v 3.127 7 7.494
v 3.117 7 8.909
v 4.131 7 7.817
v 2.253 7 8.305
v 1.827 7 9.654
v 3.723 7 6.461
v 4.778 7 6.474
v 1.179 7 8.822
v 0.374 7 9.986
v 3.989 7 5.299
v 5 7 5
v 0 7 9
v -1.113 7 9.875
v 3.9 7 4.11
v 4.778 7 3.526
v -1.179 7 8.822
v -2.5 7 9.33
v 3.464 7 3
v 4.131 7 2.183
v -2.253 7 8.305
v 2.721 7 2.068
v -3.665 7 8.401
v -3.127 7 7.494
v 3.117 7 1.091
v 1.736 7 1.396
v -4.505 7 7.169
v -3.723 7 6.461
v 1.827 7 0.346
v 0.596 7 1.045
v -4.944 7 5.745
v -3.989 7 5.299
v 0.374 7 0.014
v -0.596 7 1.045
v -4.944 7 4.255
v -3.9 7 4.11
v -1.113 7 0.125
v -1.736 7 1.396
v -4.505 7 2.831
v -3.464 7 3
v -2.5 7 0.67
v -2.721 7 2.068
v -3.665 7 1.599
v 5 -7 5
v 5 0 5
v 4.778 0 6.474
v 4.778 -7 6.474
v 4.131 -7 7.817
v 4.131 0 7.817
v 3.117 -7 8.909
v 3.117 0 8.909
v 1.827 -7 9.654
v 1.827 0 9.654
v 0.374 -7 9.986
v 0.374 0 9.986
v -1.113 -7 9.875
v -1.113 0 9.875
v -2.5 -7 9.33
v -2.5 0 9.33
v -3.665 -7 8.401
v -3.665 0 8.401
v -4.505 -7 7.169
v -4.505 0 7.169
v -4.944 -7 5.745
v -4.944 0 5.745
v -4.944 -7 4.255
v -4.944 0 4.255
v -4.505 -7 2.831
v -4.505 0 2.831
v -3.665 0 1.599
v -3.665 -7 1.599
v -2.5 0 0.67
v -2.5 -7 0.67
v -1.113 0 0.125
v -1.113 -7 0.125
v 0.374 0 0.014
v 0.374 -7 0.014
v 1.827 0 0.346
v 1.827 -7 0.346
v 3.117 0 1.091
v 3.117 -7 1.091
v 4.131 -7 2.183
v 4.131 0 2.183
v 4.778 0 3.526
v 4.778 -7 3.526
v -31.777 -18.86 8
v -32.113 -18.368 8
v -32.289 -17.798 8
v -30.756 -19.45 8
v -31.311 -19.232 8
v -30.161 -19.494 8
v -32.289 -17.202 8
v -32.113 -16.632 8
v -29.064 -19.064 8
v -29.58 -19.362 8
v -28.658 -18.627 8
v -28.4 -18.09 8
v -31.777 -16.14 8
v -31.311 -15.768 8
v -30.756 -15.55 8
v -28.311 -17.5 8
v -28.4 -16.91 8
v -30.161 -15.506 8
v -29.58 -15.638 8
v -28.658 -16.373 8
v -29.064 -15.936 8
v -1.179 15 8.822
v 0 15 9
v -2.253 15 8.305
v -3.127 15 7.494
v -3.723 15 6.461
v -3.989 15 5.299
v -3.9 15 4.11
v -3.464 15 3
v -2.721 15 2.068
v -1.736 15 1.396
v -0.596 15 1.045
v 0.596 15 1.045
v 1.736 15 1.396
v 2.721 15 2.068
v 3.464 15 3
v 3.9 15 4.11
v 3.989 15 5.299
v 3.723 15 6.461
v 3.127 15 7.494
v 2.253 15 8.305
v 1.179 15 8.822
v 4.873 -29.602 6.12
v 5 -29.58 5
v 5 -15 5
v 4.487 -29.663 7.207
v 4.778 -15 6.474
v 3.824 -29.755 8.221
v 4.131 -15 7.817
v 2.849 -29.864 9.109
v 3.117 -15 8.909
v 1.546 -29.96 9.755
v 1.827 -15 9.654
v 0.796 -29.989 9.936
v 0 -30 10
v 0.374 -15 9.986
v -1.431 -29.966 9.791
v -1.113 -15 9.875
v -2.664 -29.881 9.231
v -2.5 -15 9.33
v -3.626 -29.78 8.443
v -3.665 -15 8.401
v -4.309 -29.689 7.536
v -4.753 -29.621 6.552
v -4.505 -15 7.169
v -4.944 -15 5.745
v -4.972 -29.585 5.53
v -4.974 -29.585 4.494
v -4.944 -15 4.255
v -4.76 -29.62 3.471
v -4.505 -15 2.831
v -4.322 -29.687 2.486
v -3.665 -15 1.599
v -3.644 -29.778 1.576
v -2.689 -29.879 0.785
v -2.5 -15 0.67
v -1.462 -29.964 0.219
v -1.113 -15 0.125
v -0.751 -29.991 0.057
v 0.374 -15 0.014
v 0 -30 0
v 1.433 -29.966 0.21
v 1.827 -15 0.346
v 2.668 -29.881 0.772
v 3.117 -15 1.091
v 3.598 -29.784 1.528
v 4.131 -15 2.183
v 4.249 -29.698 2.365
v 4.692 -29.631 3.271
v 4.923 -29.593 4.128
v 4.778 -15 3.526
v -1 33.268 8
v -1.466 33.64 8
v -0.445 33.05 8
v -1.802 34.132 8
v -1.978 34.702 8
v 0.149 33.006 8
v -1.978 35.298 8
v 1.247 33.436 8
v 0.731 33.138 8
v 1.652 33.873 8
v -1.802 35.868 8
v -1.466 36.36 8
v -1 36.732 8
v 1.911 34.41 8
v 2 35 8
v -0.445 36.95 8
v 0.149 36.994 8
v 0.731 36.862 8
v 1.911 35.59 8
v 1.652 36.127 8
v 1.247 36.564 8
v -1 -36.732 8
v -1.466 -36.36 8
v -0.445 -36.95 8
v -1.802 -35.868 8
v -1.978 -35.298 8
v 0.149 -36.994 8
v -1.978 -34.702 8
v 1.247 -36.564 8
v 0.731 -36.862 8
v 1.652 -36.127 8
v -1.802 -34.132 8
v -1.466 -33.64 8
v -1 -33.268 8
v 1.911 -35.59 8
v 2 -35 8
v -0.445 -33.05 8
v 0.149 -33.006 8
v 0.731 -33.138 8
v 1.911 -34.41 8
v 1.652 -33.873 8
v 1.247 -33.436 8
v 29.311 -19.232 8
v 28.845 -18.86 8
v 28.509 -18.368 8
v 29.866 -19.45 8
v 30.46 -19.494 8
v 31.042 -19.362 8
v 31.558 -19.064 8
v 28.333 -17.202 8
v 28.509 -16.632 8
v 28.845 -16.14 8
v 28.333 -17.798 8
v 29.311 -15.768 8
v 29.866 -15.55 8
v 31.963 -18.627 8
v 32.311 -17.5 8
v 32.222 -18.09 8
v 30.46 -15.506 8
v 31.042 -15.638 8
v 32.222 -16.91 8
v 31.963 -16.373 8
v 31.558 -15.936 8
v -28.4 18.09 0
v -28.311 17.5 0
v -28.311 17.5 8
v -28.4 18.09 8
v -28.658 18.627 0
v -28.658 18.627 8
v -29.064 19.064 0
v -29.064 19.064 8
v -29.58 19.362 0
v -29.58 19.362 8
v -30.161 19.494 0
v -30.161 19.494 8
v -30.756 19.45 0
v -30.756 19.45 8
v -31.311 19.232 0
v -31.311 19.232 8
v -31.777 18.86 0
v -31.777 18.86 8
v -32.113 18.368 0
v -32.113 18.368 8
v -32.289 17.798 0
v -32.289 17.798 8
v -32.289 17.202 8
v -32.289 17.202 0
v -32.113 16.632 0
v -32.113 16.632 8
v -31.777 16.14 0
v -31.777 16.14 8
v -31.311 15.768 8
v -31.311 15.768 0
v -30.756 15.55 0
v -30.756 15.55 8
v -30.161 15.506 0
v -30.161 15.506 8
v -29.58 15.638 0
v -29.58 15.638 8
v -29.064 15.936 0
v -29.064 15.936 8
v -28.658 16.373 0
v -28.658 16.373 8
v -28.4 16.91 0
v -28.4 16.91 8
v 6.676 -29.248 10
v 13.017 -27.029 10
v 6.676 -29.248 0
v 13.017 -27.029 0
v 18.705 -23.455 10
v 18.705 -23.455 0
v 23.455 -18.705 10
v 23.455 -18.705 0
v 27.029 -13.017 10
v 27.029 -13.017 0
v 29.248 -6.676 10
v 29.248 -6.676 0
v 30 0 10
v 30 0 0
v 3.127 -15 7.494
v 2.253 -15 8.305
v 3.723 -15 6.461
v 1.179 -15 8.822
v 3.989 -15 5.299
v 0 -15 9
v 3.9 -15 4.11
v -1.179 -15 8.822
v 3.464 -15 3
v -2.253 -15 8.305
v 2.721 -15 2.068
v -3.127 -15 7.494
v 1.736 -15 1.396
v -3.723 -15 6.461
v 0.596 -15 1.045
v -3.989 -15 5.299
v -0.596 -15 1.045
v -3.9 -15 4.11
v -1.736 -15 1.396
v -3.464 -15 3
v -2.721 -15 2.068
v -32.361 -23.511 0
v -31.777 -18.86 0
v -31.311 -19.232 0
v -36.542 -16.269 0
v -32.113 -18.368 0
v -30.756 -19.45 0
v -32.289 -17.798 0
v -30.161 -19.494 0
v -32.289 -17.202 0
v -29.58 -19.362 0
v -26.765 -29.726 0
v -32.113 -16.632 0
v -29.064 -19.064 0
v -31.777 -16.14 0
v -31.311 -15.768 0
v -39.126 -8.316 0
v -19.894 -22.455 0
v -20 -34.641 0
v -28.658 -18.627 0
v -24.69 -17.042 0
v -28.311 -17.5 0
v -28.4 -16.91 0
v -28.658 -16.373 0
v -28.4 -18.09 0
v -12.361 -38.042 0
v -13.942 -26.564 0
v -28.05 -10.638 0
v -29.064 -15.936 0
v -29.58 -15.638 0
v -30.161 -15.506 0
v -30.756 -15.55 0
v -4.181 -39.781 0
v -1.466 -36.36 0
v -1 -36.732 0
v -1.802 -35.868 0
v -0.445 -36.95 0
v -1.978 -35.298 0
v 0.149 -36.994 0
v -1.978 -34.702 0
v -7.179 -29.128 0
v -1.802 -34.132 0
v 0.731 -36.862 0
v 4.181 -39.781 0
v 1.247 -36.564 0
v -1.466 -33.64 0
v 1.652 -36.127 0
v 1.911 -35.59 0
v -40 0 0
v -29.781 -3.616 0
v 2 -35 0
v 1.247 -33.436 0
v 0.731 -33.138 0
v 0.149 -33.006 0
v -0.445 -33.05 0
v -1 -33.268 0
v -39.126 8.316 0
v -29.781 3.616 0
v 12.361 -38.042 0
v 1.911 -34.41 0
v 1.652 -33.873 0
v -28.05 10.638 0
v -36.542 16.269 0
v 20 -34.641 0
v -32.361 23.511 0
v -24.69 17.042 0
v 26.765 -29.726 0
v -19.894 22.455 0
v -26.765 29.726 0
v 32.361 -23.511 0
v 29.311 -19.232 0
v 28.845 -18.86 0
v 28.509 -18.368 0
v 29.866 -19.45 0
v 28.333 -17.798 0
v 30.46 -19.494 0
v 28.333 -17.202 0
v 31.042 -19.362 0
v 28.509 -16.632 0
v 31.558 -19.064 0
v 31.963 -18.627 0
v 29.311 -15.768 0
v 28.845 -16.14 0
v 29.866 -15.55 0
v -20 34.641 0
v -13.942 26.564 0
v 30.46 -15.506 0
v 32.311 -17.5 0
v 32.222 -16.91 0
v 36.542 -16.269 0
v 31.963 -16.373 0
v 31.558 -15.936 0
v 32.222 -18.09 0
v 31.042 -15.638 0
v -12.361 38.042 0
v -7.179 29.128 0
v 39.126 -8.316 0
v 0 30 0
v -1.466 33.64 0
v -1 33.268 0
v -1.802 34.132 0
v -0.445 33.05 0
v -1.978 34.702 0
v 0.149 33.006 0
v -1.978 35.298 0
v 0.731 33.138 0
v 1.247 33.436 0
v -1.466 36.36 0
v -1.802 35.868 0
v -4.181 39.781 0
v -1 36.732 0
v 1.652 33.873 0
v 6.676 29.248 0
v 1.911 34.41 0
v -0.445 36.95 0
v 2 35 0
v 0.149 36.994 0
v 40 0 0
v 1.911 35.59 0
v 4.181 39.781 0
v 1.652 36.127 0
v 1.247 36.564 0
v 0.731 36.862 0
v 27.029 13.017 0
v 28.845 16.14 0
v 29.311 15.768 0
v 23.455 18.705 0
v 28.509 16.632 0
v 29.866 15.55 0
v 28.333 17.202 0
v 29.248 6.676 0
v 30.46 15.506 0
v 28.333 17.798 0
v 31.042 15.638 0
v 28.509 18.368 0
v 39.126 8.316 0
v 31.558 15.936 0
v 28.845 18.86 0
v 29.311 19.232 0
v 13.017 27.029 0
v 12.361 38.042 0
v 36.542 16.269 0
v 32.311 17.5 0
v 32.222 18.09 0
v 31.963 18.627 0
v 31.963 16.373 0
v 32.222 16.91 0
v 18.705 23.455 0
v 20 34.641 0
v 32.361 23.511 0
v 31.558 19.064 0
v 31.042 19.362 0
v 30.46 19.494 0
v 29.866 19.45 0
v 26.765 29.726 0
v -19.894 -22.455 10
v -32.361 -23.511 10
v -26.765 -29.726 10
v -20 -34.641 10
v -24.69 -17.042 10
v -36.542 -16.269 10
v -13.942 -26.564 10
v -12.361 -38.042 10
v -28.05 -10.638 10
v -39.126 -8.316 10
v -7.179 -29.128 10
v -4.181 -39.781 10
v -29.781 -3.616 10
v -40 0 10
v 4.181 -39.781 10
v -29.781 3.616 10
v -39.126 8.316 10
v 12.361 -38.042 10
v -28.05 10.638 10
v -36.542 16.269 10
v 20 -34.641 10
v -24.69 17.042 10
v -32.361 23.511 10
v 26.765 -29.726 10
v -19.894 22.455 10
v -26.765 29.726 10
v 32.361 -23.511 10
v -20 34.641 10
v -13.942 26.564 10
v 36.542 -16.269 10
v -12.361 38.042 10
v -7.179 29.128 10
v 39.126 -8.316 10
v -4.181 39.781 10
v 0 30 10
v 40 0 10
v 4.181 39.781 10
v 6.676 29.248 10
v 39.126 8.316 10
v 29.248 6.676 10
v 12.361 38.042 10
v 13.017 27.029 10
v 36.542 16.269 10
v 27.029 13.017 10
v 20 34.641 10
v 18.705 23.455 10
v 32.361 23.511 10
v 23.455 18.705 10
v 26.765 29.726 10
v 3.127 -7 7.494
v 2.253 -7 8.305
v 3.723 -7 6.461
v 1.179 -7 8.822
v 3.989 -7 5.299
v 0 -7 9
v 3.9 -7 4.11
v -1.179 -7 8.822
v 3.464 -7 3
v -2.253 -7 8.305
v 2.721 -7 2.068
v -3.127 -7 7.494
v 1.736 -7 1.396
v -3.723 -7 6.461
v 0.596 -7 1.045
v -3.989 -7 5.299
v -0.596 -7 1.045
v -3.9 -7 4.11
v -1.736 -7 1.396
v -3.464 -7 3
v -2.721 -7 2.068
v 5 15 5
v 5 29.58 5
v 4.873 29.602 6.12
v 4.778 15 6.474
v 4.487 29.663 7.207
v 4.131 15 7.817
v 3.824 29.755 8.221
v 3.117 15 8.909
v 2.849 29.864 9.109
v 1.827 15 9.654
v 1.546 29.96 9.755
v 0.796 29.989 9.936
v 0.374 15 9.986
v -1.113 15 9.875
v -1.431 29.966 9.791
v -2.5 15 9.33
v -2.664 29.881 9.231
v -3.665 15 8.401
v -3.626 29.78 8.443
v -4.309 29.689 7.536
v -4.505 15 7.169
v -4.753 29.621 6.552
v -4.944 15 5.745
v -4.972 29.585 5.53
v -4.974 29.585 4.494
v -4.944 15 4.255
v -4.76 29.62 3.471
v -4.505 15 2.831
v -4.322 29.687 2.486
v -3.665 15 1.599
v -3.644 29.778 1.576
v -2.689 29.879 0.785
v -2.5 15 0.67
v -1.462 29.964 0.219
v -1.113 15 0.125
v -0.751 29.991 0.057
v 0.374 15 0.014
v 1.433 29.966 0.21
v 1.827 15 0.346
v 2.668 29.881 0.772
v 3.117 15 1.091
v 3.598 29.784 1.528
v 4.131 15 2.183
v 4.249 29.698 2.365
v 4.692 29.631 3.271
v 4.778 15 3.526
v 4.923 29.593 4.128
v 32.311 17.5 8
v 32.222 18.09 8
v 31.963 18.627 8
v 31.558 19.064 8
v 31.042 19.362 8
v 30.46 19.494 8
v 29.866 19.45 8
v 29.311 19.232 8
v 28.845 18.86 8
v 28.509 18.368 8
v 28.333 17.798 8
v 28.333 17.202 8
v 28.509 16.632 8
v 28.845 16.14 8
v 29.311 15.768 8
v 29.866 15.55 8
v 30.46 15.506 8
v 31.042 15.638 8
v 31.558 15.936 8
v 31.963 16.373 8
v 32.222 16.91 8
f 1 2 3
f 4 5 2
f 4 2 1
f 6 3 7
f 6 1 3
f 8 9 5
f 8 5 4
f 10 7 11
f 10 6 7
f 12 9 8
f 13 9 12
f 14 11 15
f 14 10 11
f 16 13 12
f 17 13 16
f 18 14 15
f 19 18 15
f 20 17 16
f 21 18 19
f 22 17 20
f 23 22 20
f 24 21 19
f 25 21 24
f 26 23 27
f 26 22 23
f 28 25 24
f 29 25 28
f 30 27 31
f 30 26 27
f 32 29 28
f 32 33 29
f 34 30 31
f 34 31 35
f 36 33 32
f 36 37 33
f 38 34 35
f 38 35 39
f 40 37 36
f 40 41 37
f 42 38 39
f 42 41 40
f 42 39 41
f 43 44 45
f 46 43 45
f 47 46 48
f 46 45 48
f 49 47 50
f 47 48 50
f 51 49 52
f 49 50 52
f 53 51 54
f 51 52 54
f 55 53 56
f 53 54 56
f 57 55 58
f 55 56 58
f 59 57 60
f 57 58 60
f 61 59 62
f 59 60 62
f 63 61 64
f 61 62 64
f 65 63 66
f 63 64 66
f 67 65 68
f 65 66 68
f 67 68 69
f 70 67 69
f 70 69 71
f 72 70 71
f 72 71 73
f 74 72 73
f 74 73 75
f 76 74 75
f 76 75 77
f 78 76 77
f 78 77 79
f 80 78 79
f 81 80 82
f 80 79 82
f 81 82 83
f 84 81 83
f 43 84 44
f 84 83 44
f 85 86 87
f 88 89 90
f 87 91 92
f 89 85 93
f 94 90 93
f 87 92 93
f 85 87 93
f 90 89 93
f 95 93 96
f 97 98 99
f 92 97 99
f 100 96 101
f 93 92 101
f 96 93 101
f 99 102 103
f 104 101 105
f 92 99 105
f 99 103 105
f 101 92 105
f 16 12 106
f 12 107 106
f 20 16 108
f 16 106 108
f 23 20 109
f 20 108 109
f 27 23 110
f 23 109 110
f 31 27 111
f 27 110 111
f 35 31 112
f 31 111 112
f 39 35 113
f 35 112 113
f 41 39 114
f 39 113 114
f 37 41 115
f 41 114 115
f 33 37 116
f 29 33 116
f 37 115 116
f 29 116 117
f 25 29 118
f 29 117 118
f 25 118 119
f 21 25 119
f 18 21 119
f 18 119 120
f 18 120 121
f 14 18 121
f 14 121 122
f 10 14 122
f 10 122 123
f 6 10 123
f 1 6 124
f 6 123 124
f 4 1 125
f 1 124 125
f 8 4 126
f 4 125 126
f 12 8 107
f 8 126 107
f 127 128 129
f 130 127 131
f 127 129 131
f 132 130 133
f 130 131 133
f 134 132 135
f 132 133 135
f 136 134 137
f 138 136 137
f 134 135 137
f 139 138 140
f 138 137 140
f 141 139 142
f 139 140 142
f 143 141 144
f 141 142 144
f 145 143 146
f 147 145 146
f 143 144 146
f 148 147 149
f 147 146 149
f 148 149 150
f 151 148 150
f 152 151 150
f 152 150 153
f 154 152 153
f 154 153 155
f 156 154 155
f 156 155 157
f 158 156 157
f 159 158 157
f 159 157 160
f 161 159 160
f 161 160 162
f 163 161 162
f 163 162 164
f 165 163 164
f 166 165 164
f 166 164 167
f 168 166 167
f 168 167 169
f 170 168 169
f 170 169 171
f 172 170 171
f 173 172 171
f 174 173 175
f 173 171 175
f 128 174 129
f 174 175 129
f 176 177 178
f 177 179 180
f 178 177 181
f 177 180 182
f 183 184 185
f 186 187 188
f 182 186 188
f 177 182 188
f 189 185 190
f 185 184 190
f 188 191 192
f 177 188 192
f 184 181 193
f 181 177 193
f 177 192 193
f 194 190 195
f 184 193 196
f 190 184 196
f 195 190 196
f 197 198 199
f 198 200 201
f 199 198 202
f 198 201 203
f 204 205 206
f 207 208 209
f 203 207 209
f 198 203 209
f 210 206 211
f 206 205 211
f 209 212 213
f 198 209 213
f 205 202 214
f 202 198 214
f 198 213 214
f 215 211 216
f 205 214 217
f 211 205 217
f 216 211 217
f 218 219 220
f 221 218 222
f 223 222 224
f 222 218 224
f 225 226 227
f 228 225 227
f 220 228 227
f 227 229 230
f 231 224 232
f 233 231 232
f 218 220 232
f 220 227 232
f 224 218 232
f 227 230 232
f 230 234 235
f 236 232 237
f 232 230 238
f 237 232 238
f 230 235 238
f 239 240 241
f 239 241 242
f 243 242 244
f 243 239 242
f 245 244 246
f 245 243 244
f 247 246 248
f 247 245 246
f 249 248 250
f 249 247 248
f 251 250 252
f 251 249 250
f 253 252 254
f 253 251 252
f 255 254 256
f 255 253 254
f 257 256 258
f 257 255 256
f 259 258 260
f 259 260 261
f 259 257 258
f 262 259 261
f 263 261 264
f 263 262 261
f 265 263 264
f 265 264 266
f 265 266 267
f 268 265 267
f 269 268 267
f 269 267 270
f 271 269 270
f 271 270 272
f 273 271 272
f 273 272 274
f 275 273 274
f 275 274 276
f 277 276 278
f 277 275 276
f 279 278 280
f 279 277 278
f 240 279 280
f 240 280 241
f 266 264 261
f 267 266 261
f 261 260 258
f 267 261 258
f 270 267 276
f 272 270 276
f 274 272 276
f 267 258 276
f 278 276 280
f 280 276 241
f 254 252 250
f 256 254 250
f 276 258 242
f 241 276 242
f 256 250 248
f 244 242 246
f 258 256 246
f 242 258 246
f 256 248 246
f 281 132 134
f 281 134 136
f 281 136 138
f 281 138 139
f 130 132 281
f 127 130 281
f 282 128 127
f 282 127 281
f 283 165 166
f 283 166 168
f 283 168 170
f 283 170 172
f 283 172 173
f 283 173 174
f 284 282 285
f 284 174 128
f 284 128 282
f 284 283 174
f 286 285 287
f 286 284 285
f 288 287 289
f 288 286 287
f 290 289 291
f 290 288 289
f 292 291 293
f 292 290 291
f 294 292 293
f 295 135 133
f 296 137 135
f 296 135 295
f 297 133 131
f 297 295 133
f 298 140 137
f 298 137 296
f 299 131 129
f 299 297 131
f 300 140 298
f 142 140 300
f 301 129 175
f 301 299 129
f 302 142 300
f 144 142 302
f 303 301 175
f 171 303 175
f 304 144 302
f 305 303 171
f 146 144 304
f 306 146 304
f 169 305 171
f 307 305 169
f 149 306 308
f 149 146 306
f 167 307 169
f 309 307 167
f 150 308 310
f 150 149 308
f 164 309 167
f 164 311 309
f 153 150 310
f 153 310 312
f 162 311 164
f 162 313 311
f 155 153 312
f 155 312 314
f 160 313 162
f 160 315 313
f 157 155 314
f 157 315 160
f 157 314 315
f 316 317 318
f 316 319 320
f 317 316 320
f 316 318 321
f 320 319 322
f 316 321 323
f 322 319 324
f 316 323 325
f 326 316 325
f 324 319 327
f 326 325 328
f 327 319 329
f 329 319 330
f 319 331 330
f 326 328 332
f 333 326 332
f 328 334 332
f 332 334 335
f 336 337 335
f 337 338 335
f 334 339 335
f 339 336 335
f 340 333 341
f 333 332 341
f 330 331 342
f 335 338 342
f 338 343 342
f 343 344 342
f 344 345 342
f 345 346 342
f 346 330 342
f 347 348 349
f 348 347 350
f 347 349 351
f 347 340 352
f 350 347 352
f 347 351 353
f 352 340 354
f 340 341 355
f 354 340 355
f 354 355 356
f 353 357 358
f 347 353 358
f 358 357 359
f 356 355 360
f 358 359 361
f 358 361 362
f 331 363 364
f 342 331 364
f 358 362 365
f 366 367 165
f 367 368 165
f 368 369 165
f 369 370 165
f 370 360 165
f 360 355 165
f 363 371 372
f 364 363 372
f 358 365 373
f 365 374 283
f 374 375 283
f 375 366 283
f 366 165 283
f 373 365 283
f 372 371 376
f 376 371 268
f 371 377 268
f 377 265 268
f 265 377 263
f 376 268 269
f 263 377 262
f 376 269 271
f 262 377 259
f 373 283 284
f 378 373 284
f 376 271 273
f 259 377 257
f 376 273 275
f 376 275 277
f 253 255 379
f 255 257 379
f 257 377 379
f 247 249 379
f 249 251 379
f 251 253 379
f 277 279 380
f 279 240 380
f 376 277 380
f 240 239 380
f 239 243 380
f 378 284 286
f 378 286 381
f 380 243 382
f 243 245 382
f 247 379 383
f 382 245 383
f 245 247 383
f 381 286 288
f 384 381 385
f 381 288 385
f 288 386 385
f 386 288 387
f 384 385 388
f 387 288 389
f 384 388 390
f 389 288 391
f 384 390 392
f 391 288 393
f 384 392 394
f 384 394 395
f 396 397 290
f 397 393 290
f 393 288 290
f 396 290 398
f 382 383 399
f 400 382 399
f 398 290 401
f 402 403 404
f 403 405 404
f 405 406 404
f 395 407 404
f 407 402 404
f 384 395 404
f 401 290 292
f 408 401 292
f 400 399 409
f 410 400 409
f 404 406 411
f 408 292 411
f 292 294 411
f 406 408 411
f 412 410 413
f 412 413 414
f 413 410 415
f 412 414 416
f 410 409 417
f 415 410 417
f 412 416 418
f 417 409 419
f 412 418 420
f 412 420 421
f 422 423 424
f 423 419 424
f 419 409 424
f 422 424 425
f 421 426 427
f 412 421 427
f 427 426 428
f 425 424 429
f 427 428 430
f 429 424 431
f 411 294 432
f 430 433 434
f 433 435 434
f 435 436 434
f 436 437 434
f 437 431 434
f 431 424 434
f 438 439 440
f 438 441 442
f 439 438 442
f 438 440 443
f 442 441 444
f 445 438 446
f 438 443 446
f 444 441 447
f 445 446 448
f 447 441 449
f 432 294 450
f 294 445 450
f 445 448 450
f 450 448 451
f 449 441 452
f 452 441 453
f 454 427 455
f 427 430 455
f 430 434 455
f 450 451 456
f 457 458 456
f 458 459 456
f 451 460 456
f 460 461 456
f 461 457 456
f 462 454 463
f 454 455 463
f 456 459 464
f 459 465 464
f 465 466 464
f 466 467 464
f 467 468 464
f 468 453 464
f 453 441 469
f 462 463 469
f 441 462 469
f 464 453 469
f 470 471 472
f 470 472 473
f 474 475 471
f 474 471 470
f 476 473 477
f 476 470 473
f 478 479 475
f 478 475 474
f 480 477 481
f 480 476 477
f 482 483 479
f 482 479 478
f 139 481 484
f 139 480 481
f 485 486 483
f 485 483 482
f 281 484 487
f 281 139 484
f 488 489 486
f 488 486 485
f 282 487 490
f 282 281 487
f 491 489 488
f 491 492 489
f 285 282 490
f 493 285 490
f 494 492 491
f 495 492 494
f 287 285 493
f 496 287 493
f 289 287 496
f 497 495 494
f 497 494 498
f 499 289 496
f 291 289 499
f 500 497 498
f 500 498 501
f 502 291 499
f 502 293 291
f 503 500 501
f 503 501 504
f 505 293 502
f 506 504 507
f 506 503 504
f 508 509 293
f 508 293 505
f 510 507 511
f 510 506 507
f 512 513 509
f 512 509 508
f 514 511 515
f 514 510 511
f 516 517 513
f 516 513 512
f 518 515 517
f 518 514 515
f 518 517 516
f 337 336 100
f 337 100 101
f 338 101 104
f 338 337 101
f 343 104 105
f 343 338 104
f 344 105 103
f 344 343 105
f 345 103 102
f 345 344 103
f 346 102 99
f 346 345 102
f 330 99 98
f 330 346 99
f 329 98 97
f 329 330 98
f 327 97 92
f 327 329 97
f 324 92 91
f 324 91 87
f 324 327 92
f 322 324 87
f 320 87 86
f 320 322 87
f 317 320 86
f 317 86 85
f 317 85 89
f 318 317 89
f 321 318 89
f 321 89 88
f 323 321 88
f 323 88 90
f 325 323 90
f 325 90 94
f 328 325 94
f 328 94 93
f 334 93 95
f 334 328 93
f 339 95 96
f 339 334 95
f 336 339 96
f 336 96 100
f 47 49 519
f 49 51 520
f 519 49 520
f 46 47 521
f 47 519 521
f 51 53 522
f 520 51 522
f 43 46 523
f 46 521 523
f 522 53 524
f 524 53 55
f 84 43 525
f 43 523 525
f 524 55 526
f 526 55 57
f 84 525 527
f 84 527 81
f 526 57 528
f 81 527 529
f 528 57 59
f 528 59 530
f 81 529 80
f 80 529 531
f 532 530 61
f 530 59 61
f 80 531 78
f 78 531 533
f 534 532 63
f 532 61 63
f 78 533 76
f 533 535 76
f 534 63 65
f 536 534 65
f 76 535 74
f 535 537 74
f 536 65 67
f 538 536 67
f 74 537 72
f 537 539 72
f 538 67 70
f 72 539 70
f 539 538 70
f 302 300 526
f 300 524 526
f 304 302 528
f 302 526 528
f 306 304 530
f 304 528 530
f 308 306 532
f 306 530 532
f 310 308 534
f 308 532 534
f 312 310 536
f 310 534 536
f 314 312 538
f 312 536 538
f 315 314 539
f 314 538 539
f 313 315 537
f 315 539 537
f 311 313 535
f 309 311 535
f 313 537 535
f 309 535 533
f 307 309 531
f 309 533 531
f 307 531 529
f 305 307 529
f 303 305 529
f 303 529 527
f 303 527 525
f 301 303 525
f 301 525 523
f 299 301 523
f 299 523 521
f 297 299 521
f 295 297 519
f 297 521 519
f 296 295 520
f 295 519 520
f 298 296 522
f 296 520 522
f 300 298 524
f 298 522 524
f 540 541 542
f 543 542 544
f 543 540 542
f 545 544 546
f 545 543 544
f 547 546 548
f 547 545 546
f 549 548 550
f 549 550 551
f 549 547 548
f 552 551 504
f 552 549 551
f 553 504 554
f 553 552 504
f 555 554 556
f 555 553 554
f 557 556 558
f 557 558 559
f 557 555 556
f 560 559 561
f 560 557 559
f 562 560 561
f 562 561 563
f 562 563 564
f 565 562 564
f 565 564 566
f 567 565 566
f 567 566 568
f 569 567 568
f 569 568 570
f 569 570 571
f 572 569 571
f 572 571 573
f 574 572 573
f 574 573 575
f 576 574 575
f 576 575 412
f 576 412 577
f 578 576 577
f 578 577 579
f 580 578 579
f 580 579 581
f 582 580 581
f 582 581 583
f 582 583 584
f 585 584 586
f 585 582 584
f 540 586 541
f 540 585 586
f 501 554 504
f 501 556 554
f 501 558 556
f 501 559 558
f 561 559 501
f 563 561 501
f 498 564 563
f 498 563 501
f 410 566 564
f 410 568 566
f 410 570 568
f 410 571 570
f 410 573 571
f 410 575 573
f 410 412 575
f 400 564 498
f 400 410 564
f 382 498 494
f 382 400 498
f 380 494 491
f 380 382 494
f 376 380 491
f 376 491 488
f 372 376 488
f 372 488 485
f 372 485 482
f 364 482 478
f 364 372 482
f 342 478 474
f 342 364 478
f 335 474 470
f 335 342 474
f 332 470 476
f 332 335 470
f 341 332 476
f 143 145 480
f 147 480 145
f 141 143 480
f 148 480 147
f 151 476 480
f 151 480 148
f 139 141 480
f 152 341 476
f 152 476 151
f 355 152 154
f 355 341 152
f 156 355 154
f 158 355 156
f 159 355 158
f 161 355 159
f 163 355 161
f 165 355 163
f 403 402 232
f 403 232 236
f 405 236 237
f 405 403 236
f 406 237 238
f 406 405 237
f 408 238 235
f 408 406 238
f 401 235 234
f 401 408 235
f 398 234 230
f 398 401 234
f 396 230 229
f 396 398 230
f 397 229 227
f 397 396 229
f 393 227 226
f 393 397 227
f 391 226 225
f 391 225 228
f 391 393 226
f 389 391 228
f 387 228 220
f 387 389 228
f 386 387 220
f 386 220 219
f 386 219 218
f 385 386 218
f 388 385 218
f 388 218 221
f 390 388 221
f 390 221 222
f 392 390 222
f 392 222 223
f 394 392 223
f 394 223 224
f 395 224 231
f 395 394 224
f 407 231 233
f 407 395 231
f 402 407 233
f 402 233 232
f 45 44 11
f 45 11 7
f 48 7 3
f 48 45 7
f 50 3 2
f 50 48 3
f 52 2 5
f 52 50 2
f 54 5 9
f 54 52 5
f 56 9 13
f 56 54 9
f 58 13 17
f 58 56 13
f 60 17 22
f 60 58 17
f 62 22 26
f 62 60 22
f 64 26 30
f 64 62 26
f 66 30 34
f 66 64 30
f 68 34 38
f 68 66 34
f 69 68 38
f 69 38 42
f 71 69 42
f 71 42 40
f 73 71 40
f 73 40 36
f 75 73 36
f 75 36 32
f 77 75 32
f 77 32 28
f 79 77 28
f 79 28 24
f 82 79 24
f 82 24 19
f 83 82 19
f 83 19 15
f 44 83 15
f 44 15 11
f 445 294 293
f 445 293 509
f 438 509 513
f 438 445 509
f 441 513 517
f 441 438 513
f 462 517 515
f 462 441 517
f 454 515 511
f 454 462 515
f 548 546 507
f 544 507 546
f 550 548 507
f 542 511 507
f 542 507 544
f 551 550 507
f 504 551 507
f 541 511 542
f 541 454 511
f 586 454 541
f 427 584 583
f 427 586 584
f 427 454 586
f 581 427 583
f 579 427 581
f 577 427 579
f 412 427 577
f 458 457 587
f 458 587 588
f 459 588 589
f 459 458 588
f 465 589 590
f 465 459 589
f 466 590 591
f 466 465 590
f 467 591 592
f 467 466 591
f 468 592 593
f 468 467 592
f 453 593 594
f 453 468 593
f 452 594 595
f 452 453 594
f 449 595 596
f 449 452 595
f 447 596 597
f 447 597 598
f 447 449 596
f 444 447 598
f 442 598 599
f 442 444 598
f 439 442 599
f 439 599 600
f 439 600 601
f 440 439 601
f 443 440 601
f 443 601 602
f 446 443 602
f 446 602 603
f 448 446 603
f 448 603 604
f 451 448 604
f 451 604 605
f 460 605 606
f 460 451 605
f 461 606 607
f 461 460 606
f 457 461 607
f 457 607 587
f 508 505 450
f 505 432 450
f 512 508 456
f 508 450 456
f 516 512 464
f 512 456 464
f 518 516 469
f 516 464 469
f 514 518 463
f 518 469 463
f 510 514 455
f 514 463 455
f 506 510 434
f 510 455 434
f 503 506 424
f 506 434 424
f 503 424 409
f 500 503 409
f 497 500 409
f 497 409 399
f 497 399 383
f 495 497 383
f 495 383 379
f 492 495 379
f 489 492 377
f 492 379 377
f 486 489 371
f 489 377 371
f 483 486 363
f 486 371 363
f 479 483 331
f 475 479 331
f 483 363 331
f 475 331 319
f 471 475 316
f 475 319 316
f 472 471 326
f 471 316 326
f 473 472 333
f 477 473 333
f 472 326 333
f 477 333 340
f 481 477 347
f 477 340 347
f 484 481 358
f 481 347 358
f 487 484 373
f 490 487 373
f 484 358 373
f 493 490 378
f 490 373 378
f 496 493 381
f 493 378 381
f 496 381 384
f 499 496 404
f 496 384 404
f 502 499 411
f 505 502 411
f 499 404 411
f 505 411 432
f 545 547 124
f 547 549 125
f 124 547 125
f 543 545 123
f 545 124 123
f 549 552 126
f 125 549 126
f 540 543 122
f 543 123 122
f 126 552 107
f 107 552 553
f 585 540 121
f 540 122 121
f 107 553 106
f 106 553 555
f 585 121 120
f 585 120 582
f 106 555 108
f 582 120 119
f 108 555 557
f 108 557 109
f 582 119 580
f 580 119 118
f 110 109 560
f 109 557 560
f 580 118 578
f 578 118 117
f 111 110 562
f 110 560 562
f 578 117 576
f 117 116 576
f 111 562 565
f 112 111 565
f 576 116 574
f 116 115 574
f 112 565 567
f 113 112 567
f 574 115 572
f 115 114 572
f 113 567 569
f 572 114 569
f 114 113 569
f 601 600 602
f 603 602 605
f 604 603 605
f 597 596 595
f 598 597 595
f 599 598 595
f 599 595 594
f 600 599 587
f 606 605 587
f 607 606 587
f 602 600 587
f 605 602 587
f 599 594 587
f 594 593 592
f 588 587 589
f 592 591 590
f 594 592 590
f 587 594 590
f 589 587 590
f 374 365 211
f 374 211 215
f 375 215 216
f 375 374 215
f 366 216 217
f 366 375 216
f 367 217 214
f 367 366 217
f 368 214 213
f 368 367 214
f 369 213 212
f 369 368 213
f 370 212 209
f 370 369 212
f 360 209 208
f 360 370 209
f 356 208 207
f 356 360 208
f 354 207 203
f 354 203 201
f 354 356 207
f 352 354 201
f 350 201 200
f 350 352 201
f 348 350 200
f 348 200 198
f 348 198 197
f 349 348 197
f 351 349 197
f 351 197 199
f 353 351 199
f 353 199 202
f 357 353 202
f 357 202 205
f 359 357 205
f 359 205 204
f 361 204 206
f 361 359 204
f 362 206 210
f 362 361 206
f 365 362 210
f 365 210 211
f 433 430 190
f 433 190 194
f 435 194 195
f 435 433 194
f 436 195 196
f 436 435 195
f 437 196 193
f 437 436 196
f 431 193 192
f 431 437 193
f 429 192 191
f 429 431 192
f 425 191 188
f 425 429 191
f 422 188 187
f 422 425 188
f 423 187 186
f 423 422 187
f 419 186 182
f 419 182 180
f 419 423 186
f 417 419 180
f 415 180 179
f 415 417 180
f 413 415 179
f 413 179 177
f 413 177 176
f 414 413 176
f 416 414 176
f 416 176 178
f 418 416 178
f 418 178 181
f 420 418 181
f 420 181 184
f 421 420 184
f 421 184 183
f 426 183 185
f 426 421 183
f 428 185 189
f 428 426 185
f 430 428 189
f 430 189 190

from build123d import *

# Parameters (mm, degrees)
F0_R          = 40
F0_R_2        = 2
F0_R_3        = 30
F1_DEPTH      = 8
F2_R          = 40
F2_R_2        = 30
F3_DEPTH      = 2
F4_R          = 5
F5_DEPTH      = 30
F5_DEPTH_BACK = 30
F6_W          = 8
F6_H          = 1


with BuildPart() as f1:
    # F0 (on Top) → F1 (new body)
    with BuildSketch(Plane.XY):
        Circle(F0_R)
        with Locations((-30.310889, -17.5)):
            Circle(F0_R_2, mode=Mode.SUBTRACT)
        with Locations((0, -35)):
            Circle(F0_R_2, mode=Mode.SUBTRACT)
        with Locations((30.310889, -17.5)):
            Circle(F0_R_2, mode=Mode.SUBTRACT)
        with Locations((-30.310889, 17.5)):
            Circle(F0_R_2, mode=Mode.SUBTRACT)
        Circle(F0_R_3, mode=Mode.SUBTRACT)
        with Locations((30.310889, 17.5)):
            Circle(F0_R_2, mode=Mode.SUBTRACT)
        with Locations((0, 35)):
            Circle(F0_R_2, mode=Mode.SUBTRACT)
    extrude(amount=F1_DEPTH)

    # F2 (on face) → F3 (join)
    with BuildSketch(Plane.XY.offset(8)):
        Circle(F2_R)
        Circle(F2_R_2, mode=Mode.SUBTRACT)
    extrude(amount=F3_DEPTH)

    # F4 (on Front) → F5 (join, two sides)
    with BuildSketch(Plane.XZ) as f5_sk:
        with Locations((0, 5)):
            Circle(F4_R)
    extrude(amount=F5_DEPTH)
    extrude(f5_sk.sketch, amount=-F5_DEPTH_BACK)

    # F6 (on Right) → F7 (revolve, cut)
    with BuildSketch(Plane.YZ):
        with Locations((11, 9.5)):
            Rectangle(F6_W, F6_H)
        with Locations((-11, 9.5)):
            Rectangle(F6_W, F6_H)
    revolve(axis=Axis((0, 0, 5), (0, -1, 0)), mode=Mode.SUBTRACT)


solid = f1.part
